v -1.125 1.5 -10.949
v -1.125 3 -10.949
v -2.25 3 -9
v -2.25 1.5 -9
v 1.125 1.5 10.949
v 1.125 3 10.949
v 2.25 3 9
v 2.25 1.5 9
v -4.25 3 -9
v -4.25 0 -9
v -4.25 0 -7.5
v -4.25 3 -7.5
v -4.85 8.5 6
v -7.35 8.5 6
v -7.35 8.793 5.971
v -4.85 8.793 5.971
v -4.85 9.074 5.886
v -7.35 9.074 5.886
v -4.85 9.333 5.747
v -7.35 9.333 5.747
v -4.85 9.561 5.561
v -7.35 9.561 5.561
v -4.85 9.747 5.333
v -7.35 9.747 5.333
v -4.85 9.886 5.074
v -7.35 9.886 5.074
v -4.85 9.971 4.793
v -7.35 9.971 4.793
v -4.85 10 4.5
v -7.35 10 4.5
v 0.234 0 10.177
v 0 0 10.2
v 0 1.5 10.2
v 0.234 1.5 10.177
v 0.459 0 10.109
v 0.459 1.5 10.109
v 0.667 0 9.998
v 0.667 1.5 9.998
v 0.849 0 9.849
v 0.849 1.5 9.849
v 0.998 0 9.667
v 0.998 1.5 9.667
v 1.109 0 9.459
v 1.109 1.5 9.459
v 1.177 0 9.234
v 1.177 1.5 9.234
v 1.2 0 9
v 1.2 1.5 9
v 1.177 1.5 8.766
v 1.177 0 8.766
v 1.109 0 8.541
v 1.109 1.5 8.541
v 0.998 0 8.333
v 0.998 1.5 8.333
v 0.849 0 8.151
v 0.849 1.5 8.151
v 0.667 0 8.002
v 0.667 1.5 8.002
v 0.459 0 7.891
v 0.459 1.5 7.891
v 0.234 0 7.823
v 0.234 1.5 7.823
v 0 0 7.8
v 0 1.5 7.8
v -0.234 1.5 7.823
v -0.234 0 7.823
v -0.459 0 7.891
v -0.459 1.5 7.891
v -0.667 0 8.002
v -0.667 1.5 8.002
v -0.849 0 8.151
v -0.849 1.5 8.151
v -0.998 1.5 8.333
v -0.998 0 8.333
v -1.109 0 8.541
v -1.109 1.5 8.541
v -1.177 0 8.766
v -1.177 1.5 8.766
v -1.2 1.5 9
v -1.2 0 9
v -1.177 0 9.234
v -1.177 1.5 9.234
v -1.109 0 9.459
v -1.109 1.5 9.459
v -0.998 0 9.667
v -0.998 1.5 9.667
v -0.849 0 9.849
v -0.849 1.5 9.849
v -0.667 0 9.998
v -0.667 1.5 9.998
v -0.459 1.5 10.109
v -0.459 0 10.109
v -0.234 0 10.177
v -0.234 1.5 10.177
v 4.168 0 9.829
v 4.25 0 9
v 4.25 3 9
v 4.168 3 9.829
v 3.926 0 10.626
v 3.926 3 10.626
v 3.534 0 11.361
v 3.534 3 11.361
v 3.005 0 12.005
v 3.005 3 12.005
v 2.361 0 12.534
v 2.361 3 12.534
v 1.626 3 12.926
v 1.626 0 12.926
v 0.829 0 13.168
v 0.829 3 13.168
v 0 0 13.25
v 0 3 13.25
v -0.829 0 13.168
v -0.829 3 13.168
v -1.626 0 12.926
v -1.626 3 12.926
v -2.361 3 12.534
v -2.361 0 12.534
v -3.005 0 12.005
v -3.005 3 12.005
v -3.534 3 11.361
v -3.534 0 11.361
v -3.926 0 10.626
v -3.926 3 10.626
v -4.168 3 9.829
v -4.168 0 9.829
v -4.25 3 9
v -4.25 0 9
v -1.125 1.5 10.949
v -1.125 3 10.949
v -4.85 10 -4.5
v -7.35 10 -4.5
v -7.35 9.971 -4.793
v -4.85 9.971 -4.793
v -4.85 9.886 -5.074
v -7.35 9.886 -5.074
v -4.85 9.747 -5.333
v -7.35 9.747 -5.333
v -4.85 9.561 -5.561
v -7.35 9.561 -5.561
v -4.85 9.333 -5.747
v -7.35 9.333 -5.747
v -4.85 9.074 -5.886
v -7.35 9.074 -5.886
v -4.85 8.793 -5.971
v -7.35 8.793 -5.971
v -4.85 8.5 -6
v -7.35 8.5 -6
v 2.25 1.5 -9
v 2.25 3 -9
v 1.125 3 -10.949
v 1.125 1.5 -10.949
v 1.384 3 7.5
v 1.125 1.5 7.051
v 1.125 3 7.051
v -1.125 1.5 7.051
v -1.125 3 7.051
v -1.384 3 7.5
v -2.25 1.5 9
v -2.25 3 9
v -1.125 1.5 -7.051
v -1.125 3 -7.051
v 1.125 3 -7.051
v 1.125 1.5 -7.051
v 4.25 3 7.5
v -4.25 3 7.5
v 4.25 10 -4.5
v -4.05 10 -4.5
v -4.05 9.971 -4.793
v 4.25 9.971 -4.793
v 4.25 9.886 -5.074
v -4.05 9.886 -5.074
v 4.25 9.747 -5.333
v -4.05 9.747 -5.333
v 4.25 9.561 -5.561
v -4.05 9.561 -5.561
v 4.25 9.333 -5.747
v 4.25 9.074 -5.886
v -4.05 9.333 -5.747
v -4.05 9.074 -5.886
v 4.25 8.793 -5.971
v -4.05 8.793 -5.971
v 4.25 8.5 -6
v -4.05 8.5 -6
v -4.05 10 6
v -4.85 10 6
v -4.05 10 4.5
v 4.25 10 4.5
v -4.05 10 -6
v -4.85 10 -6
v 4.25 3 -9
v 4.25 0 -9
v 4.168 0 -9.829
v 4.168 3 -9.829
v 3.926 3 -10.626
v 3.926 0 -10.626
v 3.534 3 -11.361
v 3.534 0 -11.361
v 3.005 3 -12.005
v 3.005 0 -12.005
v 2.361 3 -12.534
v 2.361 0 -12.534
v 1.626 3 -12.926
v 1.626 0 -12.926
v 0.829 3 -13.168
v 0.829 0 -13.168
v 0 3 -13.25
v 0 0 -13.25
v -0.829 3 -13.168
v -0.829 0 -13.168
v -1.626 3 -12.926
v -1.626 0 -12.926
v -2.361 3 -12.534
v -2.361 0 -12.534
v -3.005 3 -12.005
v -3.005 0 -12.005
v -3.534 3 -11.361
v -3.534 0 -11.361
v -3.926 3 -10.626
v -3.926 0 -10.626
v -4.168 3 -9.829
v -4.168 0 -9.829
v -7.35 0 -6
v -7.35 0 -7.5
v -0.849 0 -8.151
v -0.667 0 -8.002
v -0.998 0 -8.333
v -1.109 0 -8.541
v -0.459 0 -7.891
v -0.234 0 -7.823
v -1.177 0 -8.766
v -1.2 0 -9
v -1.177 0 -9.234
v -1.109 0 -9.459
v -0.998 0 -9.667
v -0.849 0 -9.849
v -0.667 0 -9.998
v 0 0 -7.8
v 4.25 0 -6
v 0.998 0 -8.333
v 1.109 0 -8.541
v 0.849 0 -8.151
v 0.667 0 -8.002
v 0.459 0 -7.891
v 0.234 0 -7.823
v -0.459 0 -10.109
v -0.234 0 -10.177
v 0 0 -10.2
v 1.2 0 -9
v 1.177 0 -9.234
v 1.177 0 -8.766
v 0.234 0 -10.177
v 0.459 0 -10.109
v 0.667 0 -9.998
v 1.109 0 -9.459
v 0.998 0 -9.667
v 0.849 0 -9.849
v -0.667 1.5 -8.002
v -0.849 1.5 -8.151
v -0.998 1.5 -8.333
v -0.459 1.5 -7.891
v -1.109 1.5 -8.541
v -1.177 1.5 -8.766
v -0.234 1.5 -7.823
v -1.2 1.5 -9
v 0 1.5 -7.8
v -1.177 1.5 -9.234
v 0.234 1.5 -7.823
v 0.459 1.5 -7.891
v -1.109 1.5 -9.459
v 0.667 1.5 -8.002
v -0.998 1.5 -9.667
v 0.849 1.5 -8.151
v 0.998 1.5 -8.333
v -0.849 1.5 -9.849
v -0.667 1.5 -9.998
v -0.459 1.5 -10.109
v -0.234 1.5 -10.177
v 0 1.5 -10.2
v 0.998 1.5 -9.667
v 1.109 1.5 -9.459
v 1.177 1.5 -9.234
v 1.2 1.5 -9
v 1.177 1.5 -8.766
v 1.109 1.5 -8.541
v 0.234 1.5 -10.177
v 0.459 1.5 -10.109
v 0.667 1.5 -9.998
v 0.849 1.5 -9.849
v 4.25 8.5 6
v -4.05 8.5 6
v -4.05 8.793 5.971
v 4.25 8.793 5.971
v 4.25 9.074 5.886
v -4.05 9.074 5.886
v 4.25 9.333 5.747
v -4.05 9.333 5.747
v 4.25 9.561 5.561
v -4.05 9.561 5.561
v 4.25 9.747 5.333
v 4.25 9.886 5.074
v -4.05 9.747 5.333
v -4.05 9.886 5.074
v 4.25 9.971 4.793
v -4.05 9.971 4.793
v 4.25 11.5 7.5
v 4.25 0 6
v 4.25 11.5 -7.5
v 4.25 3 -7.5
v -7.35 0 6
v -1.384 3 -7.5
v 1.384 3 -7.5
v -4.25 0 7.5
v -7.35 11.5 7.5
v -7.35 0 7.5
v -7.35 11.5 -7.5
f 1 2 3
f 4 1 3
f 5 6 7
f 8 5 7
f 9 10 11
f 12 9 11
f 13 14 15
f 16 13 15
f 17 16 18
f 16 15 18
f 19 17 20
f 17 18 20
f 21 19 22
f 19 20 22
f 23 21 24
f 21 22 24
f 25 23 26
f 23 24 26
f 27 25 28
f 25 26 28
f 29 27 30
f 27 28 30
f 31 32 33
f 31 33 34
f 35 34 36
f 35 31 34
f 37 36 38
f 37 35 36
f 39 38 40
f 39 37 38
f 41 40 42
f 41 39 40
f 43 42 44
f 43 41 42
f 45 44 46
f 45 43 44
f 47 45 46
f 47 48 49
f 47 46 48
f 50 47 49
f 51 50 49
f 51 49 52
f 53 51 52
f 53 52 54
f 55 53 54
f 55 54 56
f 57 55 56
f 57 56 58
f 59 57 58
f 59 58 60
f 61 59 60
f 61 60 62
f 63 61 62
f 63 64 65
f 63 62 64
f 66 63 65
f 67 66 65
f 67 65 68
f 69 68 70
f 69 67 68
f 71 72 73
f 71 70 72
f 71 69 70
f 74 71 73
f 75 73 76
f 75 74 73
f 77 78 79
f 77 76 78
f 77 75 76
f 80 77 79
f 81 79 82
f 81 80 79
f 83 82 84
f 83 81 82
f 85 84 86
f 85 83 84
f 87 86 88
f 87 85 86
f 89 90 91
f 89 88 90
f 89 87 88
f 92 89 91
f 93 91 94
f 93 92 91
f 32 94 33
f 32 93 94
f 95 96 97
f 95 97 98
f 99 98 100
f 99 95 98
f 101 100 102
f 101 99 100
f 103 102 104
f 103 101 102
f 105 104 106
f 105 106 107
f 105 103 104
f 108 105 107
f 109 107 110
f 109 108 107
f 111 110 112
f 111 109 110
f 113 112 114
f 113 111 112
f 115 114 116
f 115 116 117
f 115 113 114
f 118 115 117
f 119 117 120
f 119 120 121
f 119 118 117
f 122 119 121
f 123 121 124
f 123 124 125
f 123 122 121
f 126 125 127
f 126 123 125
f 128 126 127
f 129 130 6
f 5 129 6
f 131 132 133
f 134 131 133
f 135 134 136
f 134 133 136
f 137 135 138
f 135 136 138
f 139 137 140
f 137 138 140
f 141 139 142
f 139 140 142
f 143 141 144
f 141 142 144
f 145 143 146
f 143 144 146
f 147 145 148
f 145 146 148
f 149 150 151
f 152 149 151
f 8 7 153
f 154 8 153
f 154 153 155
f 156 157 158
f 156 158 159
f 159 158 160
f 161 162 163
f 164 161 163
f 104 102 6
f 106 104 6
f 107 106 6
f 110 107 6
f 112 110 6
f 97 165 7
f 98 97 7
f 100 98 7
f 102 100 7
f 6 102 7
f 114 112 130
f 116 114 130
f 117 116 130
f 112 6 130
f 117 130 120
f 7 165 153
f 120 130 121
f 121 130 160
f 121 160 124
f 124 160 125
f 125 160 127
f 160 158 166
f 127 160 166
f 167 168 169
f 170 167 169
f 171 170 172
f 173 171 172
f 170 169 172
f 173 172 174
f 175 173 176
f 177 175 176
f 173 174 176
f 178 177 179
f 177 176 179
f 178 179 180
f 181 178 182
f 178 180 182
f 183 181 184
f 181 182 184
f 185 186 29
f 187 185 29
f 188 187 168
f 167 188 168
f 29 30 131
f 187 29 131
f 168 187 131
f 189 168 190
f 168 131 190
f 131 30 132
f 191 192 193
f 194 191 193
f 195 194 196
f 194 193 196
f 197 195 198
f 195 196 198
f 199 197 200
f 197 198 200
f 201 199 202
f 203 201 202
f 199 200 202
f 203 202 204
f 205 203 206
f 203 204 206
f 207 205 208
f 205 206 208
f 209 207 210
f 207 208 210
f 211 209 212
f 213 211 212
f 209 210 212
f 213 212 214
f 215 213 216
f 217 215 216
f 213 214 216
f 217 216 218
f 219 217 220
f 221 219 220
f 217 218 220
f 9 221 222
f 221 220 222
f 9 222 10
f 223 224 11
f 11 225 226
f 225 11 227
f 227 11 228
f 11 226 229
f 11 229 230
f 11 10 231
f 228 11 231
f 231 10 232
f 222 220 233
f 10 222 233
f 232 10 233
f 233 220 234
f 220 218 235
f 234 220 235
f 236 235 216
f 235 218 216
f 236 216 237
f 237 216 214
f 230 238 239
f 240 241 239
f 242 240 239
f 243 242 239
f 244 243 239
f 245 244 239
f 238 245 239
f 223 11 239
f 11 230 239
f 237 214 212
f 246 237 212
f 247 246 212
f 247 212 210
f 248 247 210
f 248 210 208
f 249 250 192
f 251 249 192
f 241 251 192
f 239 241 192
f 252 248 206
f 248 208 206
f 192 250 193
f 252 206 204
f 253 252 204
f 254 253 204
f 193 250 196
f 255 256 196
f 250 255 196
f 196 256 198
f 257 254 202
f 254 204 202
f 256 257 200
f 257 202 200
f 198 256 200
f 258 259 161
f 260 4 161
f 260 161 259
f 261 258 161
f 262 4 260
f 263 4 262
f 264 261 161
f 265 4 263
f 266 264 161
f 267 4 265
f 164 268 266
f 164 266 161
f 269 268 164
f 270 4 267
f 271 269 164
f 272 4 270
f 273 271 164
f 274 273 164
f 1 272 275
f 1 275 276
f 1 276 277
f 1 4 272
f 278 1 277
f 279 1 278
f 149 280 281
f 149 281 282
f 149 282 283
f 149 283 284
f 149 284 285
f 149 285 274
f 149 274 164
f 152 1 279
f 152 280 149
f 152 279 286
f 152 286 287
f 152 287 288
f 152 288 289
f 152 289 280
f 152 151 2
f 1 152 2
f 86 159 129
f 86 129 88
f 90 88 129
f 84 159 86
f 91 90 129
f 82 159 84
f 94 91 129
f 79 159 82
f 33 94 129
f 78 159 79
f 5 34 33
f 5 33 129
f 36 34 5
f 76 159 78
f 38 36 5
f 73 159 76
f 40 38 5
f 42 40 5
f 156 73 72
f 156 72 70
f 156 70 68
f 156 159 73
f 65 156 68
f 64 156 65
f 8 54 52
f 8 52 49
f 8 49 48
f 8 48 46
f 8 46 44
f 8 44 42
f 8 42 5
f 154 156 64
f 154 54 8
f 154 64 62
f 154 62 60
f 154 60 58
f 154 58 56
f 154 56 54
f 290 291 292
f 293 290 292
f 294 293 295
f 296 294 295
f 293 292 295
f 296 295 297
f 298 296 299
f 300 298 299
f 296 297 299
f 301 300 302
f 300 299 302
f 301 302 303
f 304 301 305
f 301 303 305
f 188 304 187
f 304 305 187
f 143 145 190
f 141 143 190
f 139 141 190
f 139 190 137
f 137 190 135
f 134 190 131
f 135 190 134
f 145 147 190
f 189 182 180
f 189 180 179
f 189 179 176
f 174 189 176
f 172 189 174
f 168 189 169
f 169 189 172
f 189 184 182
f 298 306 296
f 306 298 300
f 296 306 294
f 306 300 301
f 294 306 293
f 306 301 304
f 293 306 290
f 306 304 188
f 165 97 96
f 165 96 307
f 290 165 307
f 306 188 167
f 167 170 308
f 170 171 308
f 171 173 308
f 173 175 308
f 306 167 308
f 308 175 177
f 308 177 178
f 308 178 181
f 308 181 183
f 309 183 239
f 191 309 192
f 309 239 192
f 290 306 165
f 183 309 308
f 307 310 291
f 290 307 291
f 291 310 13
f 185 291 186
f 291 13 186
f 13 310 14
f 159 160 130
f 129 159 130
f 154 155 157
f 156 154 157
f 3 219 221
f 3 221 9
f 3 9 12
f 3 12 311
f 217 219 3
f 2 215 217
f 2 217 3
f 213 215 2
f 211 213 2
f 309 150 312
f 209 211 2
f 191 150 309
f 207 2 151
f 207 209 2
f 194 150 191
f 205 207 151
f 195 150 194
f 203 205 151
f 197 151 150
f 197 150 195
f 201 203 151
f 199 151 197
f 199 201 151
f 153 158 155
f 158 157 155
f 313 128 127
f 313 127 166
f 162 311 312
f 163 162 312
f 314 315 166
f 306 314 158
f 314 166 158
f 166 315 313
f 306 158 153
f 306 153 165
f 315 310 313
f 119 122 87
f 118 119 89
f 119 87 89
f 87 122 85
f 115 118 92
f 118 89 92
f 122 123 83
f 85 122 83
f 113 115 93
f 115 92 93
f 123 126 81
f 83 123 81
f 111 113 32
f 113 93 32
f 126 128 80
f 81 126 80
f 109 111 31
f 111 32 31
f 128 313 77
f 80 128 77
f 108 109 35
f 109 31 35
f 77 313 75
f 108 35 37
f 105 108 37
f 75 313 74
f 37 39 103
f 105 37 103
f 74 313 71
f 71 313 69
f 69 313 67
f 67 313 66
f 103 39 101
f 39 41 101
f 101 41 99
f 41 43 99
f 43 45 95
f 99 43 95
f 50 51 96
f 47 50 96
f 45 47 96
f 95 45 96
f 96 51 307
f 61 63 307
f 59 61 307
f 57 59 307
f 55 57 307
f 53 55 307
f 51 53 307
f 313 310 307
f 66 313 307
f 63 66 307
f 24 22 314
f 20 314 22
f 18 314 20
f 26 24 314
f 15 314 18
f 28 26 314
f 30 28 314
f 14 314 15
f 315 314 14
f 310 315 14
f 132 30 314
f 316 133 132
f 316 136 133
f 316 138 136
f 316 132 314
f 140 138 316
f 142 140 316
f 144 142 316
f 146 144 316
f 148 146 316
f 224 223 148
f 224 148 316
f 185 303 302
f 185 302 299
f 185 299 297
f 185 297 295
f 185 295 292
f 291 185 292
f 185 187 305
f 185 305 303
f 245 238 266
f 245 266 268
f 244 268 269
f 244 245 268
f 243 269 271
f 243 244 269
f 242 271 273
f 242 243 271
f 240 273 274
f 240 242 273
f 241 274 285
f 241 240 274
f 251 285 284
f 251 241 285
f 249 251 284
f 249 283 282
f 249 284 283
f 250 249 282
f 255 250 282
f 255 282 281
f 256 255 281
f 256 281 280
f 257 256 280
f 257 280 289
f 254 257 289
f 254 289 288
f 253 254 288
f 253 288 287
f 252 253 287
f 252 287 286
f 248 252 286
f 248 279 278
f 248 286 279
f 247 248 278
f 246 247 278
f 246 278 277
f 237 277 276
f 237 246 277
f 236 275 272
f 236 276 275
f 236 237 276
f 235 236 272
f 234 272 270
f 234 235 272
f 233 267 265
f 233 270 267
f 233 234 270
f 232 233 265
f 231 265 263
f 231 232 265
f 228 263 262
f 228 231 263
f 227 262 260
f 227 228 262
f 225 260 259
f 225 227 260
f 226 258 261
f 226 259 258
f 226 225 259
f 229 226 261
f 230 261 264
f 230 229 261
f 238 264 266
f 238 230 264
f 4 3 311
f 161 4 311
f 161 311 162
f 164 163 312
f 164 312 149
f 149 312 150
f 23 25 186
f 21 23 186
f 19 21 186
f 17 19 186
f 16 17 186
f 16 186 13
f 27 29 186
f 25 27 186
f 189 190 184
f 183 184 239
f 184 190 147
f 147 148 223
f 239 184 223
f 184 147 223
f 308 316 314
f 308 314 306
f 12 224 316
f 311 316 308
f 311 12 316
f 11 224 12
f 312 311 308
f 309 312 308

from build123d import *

# Parameters (mm, degrees)
SKETCH1_W                = 11.6
SKETCH1_H                = 15
BODY_DEPTH               = 11.5
FLANGE_DEPTH             = 3
HOLDER_NUT_START         = 3
HOLDER_NUT_DEPTH         = 1.5
HOLE_M2_DEPTH            = 20.021960992
HOLE_M2_DEPTH_BACK       = 20.021960992
SKETCH8_R                = 1.2
FIXTURE_MOTOR_DEPTH      = 20.021960992
FIXTURE_MOTOR_DEPTH_BACK = 20.021960992
GEARBOX_NOTCHES_START    = -9.1
GEARBOX_NOTCHES_DEPTH    = 0.8


with BuildPart() as part:
    # Sketch1 → body (new body)
    with BuildSketch(Plane(origin=(0, 0, 0), x_dir=(1, 0, 0), z_dir=(0, 1, 0))):
        with Locations((-1.55, 0)):
            Rectangle(SKETCH1_W, SKETCH1_H)
    extrude(amount=BODY_DEPTH)

    # Sketch2 → flange (add)
    with BuildSketch(Plane(origin=(0, 0, 0), x_dir=(1, 0, 0), z_dir=(0, 1, 0))):
        with BuildLine():
            Line((-4.25, 9), (-4.25, 7.5))
            Line((-4.25, 7.5), (4.25, 7.5))
            Line((4.25, 7.5), (4.25, 9))
            ThreePointArc((4.25, 9), (0, 13.25), (-4.25, 9))
        make_face()
        with BuildLine():
            Line((4.25, -7.5), (4.25, -9))
            ThreePointArc((4.25, -9), (0, -13.25), (-4.25, -9))
            Line((-4.25, -9), (-4.25, -7.5))
            Line((-4.25, -7.5), (4.25, -7.5))
        make_face()
    extrude(amount=FLANGE_DEPTH)

    # Sketch5 → holder-nut (cut)
    with BuildSketch(Plane(origin=(0, 0, 0), x_dir=(1, 0, 0), z_dir=(0, 1, 0)).offset(HOLDER_NUT_START)):
        Polygon((2.25, 9), (1.125, 10.948557159), (-1.125, 10.948557159), (-2.25, 9), (-1.125, 7.051442841), (1.125, 7.051442841), align=None)
        Polygon((2.25, -9), (1.125, -7.051442841), (-1.125, -7.051442841), (-2.25, -9), (-1.125, -10.948557159), (1.125, -10.948557159), align=None)
    extrude(amount=-HOLDER_NUT_DEPTH, mode=Mode.SUBTRACT)

    # Sketch8 → hole-M2 (cut, two sides: drawn at the far end of the back side and taken through both)
    with BuildSketch(Plane(origin=(0, 0, 0), x_dir=(1, 0, 0), z_dir=(0, 1, 0)).offset(-HOLE_M2_DEPTH_BACK)):
        with Locations(Location((0, 9, 0), (0, 0, 270))):
            Circle(SKETCH8_R)
        with Locations(Location((0, -9, 0), (0, 0, 270))):
            Circle(SKETCH8_R)
    extrude(amount=HOLE_M2_DEPTH + HOLE_M2_DEPTH_BACK, mode=Mode.SUBTRACT)

    # Sketch7 → fixture-motor (cut, two sides: drawn at the far end of the back side and taken through both)
    with BuildSketch(Plane(origin=(0, 0, 0), x_dir=(0, 0, -1), z_dir=(1, 0, 0)).offset(-FIXTURE_MOTOR_DEPTH_BACK)):
        with BuildLine():
            Line((-4.5, 10), (4.5, 10))
            ThreePointArc((4.5, 10), (5.560660172, 9.560660172), (6, 8.5))
            Line((6, 8.5), (6, 0))
            Line((6, 0), (-6, 0))
            Line((-6, 0), (-6, 8.5))
            ThreePointArc((-6, 8.5), (-5.560660172, 9.560660172), (-4.5, 10))
        make_face()
    extrude(amount=FIXTURE_MOTOR_DEPTH + FIXTURE_MOTOR_DEPTH_BACK, mode=Mode.SUBTRACT)

    # Sketch9 → gearbox-notches (cut)
    with BuildSketch(Plane(origin=(4.25, 0, 0), x_dir=(0, 0, -1), z_dir=(1, 0, 0)).offset(GEARBOX_NOTCHES_START)):
        with BuildLine():
            Line((-6, 8.5), (-6, 10))
            Line((-6, 10), (-4.5, 10))
            ThreePointArc((-4.5, 10), (-5.560660172, 9.560660172), (-6, 8.5))
        make_face()
        with BuildLine():
            Line((4.5, 10), (6, 10))
            Line((6, 10), (6, 8.5))
            ThreePointArc((6, 8.5), (5.560660172, 9.560660172), (4.5, 10))
        make_face()
    extrude(amount=GEARBOX_NOTCHES_DEPTH, mode=Mode.SUBTRACT)


solid = part.part
